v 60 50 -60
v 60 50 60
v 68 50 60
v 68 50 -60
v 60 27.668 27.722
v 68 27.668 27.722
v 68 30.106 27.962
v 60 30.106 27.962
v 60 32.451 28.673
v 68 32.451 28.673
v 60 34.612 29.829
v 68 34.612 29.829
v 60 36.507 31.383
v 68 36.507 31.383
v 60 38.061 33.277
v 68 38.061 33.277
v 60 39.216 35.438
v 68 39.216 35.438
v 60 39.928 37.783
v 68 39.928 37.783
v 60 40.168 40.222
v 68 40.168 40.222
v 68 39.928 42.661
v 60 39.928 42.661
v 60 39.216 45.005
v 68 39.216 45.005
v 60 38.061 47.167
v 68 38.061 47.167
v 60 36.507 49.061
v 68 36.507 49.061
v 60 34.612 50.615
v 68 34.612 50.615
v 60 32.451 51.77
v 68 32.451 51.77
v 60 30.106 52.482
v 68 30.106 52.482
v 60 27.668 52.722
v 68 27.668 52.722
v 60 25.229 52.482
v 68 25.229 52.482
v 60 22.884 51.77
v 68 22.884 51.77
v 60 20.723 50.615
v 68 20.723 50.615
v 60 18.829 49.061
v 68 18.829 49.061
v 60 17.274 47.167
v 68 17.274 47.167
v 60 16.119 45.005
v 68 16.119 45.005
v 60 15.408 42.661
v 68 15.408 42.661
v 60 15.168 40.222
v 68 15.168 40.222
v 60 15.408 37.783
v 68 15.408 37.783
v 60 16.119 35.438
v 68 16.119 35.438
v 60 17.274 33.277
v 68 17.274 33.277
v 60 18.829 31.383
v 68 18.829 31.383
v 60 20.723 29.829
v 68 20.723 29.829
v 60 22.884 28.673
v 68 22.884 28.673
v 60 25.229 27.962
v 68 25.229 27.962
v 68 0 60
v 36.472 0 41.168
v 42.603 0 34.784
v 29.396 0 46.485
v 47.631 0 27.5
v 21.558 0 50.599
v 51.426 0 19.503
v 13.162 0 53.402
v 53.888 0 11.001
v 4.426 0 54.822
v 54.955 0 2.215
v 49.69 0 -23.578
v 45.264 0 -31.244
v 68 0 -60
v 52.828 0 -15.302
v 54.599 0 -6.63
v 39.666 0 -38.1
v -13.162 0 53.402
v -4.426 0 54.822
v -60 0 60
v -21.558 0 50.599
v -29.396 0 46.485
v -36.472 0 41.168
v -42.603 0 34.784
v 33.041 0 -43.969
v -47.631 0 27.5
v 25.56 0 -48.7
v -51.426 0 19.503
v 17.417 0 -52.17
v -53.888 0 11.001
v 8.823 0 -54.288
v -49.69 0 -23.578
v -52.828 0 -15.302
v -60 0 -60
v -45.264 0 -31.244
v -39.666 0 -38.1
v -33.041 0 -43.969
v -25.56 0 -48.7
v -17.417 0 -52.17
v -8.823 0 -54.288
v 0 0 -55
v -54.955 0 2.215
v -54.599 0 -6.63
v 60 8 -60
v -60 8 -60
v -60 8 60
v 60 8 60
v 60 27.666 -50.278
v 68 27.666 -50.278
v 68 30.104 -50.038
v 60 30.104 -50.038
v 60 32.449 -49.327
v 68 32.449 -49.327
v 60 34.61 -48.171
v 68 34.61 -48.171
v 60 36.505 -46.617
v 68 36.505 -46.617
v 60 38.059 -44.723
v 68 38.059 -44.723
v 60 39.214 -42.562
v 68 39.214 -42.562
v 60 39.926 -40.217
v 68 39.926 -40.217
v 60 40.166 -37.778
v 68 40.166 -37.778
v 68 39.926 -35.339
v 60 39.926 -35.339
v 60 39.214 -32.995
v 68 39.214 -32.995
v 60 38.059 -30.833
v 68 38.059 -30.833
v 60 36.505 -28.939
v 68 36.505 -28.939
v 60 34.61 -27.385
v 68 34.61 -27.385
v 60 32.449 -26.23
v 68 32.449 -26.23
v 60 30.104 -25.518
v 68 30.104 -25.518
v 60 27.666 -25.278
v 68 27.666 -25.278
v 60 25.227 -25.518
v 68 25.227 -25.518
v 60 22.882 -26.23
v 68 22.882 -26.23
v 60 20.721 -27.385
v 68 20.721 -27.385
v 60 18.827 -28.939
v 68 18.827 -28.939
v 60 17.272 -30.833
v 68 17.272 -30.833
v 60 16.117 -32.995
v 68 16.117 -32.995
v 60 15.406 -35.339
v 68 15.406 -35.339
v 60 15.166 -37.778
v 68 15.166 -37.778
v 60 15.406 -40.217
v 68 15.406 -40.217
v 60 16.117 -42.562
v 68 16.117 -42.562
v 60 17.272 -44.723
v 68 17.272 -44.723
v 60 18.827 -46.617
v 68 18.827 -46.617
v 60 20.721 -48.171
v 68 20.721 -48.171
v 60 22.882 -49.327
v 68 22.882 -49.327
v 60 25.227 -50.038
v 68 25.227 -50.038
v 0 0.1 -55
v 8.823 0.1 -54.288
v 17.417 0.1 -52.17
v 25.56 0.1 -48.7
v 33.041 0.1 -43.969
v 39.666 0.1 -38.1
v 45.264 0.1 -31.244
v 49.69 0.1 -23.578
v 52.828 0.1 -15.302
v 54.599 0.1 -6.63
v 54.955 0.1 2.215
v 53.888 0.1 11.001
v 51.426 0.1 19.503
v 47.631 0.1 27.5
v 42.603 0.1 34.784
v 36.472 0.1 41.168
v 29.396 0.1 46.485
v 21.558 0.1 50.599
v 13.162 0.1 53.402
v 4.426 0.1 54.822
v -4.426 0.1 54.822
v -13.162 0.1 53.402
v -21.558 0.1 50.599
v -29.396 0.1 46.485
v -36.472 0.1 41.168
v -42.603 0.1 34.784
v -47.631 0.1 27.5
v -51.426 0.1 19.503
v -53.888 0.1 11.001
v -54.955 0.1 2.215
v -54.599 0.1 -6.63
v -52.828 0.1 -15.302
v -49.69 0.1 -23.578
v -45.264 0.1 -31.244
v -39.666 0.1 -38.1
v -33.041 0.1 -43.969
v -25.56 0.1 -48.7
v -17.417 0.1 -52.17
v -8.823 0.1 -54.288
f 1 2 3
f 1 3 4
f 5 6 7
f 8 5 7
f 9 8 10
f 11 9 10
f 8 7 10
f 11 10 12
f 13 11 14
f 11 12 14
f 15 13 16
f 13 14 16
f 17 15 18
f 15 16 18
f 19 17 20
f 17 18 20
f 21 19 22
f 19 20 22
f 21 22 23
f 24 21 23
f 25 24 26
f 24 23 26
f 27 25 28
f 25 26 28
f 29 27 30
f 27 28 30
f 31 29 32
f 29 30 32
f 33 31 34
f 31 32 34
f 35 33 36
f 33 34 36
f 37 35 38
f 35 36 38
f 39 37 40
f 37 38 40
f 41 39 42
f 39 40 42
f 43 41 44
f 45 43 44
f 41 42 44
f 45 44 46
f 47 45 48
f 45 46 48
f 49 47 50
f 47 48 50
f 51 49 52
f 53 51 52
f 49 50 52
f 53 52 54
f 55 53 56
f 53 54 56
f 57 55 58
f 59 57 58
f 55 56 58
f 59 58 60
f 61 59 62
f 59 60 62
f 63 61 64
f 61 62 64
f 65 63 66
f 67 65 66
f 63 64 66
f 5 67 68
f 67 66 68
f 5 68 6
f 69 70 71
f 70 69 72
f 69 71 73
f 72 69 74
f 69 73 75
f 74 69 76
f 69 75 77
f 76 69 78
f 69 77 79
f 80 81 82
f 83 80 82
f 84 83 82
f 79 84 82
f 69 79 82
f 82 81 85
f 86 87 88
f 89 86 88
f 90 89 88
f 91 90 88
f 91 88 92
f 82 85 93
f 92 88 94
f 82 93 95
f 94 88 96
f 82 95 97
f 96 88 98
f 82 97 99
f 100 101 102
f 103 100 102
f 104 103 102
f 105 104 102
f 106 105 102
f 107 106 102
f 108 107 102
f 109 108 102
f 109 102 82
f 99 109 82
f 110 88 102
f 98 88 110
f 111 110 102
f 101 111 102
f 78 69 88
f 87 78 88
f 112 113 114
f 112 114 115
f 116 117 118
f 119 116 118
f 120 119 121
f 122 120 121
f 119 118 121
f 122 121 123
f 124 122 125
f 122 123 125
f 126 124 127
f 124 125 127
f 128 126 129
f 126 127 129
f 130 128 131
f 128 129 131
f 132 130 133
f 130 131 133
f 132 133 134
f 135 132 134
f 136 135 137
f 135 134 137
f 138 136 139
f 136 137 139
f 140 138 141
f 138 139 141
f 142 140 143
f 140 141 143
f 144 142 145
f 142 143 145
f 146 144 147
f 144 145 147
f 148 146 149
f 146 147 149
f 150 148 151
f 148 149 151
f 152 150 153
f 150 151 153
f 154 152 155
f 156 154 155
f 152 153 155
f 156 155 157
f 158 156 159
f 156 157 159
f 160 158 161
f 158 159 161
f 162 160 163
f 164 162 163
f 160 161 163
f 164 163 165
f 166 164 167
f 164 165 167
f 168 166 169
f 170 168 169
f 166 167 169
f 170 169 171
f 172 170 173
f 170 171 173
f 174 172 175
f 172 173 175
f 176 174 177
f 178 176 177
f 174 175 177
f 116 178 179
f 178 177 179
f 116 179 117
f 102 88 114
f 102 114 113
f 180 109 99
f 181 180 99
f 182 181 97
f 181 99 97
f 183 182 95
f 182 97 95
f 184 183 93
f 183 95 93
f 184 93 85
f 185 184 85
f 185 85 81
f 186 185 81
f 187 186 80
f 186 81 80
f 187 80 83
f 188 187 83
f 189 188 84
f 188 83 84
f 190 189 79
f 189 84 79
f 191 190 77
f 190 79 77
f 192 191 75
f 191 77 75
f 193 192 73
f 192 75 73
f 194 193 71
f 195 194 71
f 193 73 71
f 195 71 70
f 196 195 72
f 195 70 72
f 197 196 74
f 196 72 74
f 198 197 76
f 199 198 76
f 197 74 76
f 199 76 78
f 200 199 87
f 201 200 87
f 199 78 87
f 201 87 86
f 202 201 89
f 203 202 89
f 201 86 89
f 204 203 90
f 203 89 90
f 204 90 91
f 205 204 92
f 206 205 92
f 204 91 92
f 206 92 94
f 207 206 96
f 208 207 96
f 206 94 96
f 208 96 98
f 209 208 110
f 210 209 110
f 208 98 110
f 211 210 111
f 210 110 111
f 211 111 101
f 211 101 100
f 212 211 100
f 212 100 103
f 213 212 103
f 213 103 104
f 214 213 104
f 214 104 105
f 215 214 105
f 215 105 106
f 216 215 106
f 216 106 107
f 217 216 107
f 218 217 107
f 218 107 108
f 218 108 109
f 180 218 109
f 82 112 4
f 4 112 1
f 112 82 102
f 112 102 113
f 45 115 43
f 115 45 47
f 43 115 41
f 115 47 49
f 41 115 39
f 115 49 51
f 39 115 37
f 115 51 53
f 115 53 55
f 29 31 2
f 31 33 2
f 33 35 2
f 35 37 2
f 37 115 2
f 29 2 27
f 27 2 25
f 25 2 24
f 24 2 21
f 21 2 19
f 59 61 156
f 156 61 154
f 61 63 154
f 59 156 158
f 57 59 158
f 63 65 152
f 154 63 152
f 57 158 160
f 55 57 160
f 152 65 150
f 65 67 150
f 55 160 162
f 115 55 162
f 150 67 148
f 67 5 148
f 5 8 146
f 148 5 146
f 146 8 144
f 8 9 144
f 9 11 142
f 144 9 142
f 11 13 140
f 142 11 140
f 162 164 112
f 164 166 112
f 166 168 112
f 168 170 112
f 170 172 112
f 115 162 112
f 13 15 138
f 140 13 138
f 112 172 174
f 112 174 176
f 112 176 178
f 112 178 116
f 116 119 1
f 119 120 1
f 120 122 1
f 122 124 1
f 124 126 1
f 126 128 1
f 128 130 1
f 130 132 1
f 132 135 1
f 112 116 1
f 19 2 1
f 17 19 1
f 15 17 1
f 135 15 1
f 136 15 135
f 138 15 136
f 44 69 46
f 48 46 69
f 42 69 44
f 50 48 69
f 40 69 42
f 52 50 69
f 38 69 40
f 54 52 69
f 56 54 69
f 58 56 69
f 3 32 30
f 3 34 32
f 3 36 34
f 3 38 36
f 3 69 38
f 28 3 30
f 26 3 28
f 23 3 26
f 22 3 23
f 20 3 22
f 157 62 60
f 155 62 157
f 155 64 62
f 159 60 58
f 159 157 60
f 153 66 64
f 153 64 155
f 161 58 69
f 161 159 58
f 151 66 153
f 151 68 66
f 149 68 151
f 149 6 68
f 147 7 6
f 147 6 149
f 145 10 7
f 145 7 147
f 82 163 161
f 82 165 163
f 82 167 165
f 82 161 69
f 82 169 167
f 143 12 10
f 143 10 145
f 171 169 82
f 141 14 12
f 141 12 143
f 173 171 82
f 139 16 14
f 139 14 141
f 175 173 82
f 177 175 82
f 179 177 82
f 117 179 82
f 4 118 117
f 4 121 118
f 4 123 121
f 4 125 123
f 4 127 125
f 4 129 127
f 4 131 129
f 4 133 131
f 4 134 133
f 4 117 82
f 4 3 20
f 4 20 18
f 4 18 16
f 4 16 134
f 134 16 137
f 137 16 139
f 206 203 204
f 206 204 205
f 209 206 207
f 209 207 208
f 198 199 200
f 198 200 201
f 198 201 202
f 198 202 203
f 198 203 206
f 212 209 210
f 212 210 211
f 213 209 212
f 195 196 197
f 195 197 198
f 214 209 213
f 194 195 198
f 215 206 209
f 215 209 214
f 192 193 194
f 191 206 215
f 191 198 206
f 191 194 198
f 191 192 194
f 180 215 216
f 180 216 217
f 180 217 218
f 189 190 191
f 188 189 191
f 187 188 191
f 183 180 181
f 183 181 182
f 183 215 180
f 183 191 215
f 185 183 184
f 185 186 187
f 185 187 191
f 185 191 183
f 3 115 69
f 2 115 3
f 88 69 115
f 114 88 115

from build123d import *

# Parameters (mm, degrees)
SKETCH_1_W          = 120
SKETCH_1_H          = 120
EXTRUDE_1_DEPTH     = 8
SKETCH_2_W          = 120
SKETCH_2_H          = 50
EXTRUDE_2_DEPTH     = 8
SKETCH_3_R          = 12.5
CUT_EXTRUDE_1_DEPTH = 8
SKETCH_4_R          = 55
CUT_EXTRUDE_2_DEPTH = 0.1


with BuildPart() as part:
    # 草图1 → 凸台-拉伸1 (new body)
    with BuildSketch(Plane(origin=(0, 0, 0), x_dir=(1, 0, 0), z_dir=(0, 1, 0))):
        Rectangle(SKETCH_1_W, SKETCH_1_H)
    extrude(amount=EXTRUDE_1_DEPTH)

    # 草图2 → 凸台-拉伸2 (add)
    with BuildSketch(Plane(origin=(60, 0, 0), x_dir=(0, 0, -1), z_dir=(1, 0, 0))):
        with Locations((0, 25)):
            Rectangle(SKETCH_2_W, SKETCH_2_H)
    extrude(amount=EXTRUDE_2_DEPTH)

    # 草图3 → 切除-拉伸1 (cut)
    with BuildSketch(Plane(origin=(68, 0, 0), x_dir=(0, 0, -1), z_dir=(1, 0, 0))):
        with Locations((-40.221925454, 27.667787736)):
            Circle(SKETCH_3_R)
        with Locations((37.778074521, 27.665810834)):
            Circle(SKETCH_3_R)
    extrude(amount=-CUT_EXTRUDE_1_DEPTH, mode=Mode.SUBTRACT)

    # 草图4 → 切除-拉伸2 (cut)
    with BuildSketch(Plane.XZ):
        with Locations(Location((0, 0, 0), (0, 0, 270))):
            Circle(SKETCH_4_R)
    extrude(amount=-CUT_EXTRUDE_2_DEPTH, mode=Mode.SUBTRACT)


solid = part.part
